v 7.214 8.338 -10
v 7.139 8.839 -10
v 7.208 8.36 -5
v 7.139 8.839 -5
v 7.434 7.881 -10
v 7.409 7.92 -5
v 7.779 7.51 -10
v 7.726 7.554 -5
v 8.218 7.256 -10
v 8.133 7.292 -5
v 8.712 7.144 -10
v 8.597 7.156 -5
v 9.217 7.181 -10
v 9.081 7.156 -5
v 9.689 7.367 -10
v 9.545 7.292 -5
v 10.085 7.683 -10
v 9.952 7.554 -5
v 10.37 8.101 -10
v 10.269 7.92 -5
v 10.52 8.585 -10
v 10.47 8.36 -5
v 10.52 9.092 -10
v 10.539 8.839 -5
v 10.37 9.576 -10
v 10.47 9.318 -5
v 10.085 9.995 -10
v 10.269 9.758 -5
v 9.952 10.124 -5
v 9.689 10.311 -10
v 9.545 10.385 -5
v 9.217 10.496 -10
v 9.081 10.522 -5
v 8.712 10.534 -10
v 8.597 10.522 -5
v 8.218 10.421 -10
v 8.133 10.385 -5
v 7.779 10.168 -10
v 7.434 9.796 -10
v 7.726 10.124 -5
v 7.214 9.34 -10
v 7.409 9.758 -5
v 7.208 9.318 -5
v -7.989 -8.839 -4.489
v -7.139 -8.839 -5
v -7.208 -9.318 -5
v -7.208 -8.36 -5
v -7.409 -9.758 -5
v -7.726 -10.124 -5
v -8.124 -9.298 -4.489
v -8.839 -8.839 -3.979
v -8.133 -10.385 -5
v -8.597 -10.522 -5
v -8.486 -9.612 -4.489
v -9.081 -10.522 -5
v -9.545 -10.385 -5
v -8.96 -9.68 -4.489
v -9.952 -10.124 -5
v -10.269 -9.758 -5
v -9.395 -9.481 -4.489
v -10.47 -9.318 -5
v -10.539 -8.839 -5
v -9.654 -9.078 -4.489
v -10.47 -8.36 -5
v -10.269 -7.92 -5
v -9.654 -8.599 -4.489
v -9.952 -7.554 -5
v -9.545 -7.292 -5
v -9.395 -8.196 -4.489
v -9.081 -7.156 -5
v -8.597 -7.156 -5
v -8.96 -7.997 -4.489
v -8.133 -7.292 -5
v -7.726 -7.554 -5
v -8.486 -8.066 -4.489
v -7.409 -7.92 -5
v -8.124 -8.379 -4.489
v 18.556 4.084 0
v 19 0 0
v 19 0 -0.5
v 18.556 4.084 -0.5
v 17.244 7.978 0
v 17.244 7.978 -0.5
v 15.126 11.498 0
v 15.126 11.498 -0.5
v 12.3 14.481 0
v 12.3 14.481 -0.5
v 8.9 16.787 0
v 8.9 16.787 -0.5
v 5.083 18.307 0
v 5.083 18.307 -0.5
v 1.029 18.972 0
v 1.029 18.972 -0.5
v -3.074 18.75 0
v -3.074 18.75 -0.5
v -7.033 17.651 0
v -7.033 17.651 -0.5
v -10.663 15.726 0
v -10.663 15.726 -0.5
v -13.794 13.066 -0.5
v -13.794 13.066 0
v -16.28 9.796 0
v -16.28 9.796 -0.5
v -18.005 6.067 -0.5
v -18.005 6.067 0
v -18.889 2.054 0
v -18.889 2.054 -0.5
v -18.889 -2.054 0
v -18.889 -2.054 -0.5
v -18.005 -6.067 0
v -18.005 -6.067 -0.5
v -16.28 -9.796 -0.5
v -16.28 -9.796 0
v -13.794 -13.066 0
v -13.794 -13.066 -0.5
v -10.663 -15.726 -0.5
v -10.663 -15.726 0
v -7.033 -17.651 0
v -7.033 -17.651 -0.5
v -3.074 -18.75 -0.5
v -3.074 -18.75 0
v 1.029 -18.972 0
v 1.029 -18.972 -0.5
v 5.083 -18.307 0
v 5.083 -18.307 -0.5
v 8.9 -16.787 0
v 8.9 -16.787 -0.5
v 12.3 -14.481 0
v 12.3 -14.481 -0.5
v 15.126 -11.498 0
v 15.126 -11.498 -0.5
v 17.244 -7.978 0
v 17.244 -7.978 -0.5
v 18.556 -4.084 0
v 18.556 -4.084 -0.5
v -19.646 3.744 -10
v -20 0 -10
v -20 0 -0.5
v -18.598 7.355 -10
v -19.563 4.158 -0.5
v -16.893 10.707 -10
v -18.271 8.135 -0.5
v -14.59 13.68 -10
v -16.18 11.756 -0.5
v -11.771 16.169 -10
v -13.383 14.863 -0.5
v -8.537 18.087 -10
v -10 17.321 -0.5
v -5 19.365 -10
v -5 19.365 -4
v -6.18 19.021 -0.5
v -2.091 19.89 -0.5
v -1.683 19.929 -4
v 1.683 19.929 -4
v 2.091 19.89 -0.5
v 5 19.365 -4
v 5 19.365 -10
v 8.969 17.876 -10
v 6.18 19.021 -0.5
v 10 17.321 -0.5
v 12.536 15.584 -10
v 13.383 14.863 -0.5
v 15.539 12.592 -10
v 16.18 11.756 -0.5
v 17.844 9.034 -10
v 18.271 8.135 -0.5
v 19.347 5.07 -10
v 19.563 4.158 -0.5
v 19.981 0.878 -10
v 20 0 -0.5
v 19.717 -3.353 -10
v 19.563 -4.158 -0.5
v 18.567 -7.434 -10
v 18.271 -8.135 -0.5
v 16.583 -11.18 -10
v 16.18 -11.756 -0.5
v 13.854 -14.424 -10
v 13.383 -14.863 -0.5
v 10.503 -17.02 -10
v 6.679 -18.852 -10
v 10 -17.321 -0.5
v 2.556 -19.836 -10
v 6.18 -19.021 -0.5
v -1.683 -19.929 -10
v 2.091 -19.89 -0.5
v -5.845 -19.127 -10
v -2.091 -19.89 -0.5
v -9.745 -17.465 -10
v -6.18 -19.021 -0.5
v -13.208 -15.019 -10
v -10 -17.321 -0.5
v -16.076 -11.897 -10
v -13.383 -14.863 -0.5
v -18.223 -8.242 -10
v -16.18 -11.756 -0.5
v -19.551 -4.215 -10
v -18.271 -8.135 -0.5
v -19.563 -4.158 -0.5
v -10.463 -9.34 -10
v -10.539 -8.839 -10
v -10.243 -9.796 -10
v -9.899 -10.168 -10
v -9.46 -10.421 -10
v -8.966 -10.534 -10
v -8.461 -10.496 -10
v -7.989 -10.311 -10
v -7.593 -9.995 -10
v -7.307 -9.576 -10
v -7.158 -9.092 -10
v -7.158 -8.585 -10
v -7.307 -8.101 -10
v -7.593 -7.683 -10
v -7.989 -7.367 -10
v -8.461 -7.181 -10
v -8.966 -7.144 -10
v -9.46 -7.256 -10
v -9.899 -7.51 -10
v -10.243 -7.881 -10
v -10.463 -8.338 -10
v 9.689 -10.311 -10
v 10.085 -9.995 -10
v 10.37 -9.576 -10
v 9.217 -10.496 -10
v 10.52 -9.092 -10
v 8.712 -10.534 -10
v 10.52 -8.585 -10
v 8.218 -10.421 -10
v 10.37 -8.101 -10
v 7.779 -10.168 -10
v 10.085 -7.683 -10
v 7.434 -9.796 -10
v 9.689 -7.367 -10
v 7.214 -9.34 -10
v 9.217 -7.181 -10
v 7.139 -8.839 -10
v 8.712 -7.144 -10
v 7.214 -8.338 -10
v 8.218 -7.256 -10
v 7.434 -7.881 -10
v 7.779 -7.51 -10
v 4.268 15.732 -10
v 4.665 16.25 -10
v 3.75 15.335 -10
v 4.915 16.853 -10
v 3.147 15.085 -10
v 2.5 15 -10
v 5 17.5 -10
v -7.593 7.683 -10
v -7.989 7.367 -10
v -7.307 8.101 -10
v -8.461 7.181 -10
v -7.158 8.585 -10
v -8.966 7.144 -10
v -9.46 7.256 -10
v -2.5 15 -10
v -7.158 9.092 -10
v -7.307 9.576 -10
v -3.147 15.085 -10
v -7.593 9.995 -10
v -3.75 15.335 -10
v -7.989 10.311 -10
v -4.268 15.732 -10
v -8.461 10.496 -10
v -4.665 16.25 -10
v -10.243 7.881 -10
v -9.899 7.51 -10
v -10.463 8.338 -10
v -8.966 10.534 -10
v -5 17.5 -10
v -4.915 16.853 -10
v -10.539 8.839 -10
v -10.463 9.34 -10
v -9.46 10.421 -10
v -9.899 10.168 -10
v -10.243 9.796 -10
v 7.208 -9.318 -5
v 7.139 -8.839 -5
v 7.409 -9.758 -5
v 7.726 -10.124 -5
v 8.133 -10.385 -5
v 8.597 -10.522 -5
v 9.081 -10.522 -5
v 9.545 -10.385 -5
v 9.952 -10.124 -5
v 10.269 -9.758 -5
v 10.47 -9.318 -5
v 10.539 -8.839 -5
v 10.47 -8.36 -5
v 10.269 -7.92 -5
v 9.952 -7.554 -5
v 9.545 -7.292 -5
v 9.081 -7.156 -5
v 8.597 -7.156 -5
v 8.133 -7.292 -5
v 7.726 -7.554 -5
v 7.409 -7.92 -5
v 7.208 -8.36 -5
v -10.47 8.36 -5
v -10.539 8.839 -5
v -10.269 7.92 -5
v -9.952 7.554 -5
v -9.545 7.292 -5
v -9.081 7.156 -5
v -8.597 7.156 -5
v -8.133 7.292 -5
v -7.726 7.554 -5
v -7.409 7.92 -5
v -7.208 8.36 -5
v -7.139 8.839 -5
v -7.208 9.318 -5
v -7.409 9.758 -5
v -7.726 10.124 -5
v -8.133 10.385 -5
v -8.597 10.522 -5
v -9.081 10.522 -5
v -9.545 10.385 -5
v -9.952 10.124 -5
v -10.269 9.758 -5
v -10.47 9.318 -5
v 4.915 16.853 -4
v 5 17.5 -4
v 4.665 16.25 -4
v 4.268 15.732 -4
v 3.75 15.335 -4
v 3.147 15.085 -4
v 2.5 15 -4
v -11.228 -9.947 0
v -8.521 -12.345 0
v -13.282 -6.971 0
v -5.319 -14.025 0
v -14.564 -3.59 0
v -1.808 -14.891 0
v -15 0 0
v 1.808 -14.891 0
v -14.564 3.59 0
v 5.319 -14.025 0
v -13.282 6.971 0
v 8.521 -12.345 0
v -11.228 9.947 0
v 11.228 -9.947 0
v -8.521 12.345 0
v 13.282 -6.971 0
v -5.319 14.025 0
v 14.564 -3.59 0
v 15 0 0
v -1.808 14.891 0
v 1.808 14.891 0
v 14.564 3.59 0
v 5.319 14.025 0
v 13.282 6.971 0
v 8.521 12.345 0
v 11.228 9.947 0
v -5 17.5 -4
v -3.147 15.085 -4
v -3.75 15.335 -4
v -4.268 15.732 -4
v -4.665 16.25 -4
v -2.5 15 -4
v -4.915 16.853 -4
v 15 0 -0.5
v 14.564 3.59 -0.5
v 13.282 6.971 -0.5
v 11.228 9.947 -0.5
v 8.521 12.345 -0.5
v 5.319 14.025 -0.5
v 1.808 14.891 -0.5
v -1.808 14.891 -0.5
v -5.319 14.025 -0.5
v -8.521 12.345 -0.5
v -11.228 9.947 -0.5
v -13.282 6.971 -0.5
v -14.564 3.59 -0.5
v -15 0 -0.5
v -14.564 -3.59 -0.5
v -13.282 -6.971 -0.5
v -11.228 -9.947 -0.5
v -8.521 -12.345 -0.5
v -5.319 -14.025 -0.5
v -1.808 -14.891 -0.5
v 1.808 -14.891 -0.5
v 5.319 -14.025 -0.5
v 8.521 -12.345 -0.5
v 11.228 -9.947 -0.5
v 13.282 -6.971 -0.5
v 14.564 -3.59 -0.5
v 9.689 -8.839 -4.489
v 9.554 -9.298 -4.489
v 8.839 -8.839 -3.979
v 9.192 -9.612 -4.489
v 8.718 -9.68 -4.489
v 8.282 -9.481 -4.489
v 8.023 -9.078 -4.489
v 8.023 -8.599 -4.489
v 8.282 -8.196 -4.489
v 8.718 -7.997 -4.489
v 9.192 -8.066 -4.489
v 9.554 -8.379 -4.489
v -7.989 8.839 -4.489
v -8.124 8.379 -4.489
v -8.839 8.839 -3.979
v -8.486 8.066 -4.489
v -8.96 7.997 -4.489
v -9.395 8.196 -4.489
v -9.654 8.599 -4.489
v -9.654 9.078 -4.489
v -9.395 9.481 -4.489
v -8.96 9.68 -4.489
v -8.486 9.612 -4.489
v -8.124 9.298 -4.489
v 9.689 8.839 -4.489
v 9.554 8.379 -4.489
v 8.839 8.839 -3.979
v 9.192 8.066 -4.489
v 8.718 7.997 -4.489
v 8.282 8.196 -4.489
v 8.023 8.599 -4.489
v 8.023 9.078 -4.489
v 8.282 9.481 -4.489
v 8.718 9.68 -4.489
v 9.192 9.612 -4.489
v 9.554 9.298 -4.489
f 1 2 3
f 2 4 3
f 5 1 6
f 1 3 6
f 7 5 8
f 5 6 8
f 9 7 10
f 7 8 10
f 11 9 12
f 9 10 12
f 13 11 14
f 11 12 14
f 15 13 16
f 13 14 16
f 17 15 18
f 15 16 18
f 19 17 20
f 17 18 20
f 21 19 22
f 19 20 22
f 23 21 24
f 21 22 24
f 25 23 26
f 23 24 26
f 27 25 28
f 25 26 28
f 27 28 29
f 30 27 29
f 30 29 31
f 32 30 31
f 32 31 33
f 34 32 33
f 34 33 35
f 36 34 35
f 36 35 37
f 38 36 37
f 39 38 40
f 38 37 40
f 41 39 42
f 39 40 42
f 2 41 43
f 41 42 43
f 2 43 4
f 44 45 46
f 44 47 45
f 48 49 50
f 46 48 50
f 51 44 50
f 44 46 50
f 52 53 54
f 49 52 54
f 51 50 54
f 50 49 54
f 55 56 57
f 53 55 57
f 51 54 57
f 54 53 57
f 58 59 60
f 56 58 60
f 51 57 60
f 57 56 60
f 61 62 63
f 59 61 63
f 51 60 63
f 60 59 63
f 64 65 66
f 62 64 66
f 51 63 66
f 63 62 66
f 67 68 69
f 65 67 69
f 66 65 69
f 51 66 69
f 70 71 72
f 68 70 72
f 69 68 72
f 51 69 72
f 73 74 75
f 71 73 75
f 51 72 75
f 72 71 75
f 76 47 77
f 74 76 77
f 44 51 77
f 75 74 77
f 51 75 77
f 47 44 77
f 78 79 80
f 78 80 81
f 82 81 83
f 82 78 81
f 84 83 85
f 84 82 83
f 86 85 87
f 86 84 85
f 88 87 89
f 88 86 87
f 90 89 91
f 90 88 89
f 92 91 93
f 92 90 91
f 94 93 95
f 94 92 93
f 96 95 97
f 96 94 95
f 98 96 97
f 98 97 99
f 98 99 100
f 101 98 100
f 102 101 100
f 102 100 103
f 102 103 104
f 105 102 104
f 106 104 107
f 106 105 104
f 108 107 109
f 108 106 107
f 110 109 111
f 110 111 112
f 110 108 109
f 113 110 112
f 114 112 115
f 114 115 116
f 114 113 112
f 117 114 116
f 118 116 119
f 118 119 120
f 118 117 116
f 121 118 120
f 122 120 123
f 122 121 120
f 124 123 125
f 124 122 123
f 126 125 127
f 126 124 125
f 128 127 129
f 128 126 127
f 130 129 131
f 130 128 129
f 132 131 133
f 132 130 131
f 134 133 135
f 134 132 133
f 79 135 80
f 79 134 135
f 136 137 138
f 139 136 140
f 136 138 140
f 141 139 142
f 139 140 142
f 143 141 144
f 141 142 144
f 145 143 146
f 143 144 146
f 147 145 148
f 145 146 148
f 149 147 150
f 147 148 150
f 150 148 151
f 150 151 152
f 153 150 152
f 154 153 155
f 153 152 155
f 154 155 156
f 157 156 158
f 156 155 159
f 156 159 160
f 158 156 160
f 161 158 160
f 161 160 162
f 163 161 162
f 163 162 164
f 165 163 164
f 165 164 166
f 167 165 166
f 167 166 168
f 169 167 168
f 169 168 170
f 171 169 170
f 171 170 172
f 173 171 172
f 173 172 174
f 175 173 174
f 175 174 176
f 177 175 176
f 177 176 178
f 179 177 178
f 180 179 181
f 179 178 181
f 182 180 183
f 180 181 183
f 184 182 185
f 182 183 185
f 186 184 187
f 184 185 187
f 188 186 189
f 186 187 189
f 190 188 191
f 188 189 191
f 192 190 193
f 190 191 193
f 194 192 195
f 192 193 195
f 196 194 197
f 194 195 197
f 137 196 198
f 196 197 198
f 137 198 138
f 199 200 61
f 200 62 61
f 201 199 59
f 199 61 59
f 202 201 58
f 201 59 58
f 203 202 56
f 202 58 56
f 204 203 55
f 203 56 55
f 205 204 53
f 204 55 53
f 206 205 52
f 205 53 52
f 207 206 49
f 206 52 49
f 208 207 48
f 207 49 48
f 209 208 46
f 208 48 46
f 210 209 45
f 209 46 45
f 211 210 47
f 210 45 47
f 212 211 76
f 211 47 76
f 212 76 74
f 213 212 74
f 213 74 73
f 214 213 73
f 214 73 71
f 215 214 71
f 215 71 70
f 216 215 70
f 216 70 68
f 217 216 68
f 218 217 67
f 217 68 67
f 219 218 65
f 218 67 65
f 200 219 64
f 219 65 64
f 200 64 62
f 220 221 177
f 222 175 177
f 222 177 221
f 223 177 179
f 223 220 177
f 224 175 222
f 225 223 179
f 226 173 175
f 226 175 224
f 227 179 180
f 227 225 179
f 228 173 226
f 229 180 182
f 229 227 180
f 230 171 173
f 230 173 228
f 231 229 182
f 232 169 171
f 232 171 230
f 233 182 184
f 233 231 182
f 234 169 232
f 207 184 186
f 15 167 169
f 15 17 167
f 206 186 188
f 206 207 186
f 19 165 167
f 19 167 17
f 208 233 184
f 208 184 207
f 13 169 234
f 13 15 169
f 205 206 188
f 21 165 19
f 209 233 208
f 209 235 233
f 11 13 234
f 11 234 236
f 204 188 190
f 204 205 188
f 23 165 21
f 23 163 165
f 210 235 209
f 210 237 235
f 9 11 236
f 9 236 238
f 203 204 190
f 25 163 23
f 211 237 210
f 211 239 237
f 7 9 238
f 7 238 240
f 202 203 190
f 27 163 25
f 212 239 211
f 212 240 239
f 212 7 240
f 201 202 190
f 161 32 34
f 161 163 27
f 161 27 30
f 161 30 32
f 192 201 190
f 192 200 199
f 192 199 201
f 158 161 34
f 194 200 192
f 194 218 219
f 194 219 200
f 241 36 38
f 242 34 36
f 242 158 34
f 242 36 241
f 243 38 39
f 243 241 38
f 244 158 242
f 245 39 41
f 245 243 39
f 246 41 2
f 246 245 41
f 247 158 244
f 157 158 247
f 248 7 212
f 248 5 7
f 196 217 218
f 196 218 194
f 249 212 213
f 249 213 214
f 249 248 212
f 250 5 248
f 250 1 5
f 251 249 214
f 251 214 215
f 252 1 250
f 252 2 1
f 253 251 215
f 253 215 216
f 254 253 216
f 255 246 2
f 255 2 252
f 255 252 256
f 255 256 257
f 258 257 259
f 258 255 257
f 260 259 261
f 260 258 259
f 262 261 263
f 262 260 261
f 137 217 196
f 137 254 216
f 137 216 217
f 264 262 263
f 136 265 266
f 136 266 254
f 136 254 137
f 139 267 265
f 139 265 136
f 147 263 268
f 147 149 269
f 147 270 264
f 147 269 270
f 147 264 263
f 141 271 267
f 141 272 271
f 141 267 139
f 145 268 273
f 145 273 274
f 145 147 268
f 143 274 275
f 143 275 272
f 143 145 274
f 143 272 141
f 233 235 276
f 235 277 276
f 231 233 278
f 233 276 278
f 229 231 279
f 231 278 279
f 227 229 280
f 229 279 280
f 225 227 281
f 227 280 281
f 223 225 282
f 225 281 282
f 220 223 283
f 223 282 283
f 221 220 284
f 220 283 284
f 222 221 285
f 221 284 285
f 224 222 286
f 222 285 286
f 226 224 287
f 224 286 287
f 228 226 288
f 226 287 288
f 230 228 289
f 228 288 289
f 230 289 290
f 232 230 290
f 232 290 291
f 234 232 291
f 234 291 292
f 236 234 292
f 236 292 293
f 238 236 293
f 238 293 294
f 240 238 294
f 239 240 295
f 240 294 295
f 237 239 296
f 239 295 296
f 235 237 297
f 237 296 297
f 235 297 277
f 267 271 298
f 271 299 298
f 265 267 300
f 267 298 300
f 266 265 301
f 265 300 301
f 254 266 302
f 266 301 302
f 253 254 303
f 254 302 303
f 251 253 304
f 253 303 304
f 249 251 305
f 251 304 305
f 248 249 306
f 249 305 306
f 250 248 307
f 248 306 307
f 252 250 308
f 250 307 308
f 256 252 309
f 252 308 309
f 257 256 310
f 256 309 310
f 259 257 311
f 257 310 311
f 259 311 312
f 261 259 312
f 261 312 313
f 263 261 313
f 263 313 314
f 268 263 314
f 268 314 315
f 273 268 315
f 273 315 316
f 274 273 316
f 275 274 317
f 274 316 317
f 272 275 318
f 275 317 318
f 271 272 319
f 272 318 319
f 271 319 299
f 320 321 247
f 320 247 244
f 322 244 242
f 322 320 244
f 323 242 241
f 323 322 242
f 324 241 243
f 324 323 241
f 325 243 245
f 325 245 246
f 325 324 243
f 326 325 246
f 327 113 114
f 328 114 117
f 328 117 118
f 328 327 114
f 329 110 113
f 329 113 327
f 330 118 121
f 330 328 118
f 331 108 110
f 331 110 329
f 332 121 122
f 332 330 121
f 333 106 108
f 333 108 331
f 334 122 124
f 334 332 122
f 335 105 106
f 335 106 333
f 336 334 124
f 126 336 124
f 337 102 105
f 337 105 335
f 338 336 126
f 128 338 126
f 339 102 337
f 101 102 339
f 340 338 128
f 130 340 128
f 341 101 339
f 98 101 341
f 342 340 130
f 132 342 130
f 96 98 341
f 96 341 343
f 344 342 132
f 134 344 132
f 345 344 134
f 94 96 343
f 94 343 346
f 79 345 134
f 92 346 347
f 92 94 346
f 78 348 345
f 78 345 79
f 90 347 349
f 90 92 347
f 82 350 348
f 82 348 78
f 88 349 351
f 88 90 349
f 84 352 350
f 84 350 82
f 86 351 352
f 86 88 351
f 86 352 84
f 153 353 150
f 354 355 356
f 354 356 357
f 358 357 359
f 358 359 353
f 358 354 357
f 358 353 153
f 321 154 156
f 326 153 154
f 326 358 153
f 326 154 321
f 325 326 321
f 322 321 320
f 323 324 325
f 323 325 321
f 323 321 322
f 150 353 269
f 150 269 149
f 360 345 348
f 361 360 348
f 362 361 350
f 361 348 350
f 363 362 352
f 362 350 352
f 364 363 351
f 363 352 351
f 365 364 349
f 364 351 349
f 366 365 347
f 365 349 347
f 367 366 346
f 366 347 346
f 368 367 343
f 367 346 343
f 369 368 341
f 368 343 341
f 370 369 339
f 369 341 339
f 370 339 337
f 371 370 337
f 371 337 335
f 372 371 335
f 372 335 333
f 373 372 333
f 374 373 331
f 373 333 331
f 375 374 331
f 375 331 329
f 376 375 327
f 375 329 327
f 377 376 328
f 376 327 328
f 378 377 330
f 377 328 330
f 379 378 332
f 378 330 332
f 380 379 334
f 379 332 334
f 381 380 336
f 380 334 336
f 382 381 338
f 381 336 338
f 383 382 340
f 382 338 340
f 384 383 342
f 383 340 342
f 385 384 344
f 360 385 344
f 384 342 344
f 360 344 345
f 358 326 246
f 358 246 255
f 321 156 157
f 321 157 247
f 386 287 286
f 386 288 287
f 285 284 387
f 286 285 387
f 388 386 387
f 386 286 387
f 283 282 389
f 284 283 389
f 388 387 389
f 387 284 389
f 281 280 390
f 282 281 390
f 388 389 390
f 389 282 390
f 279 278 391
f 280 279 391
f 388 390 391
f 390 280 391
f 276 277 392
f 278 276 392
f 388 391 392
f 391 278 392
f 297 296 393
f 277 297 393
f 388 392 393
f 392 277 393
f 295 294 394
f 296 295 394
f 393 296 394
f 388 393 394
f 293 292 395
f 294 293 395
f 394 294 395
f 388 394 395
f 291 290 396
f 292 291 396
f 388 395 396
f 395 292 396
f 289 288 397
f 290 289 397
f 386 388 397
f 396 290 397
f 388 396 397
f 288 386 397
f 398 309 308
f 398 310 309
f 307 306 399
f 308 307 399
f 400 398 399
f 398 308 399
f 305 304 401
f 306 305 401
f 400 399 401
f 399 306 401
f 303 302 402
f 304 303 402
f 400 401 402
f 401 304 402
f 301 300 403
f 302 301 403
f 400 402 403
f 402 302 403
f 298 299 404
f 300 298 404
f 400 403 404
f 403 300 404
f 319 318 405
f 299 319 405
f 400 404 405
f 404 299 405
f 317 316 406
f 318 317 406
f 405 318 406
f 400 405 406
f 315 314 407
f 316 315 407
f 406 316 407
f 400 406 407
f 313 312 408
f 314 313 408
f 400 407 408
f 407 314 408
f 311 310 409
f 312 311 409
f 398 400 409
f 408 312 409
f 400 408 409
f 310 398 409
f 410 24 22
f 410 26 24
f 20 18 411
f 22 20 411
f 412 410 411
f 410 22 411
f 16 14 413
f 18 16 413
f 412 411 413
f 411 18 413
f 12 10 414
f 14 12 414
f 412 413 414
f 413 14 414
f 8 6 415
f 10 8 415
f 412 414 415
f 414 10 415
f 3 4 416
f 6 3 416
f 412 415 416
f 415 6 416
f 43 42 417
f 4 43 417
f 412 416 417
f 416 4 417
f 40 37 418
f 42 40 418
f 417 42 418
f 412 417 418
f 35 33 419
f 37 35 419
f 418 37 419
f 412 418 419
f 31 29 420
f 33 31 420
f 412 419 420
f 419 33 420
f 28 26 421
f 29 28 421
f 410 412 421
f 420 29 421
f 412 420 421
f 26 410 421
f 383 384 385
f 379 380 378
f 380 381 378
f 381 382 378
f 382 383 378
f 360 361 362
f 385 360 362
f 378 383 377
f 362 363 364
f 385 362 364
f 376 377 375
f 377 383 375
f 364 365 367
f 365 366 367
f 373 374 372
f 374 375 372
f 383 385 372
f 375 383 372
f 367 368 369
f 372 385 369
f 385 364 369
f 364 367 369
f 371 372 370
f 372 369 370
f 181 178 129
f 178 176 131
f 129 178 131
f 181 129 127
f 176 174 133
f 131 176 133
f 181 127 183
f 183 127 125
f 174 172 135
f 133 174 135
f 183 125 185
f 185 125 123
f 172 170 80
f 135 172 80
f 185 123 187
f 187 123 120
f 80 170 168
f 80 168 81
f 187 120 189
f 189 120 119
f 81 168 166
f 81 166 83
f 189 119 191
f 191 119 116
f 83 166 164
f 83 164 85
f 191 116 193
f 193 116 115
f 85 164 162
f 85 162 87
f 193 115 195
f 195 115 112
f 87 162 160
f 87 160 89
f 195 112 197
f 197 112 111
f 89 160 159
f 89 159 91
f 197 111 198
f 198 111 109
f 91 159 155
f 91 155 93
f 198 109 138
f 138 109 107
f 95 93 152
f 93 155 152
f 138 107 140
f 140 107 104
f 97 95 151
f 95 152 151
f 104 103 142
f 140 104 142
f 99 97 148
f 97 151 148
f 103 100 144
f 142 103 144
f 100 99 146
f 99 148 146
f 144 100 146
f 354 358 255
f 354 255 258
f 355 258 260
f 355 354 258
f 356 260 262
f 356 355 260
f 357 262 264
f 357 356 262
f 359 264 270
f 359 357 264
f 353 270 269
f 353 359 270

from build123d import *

# Parameters (mm, degrees)
SKETCH2_R                = 19
SKETCH2_R_2              = 15
BOSS_EXTRUDE1_DEPTH      = 0.5
SKETCH3_R                = 20
BOSS_EXTRUDE2_DEPTH      = 9.5
CUT_EXTRUDE2_START       = -6
CUT_EXTRUDE2_DEPTH       = 6
M3_CLEARANCE_HOLE1_D     = 3.4
M3_CLEARANCE_HOLE1_DEPTH = 5
M3_CLEARANCE_HOLE1_TIP   = 1.021463052


with BuildPart() as part:
    # Sketch2 → Boss-Extrude1 (new body)
    with BuildSketch(Plane(origin=(0, 0, 0), x_dir=(0, 1, 0), z_dir=(0, 0, 1))):
        with Locations(Location((0, 0, 0), (0, 0, 270))):
            Circle(SKETCH2_R)
        with Locations(Location((0, 0, 0), (0, 0, 270))):
            Circle(SKETCH2_R_2, mode=Mode.SUBTRACT)
    extrude(amount=-BOSS_EXTRUDE1_DEPTH)

    # Sketch3 → Boss-Extrude2 (add)
    with BuildSketch(Plane(origin=(0, 0, -0.5), x_dir=(1, 0, 0), z_dir=(0, 0, -1))):
        with Locations(Location((0, 0, 0), (0, 0, 180))):
            Circle(SKETCH3_R)
    extrude(amount=BOSS_EXTRUDE2_DEPTH)

    # Sketch4 → Cut-Extrude2 (cut)
    with BuildSketch(Plane(origin=(0, 0, -10), x_dir=(1, 0, 0), z_dir=(0, 0, -1)).offset(CUT_EXTRUDE2_START)):
        with BuildLine():
            Line((-5, -17.5), (-5, -19.364916731))
            ThreePointArc((-5, -19.364916731), (0, -20), (5, -19.364916731))
            Line((5, -19.364916731), (5, -17.5))
            ThreePointArc((5, -17.5), (4.267766953, -15.732233047), (2.5, -15))
            Line((2.5, -15), (-2.5, -15))
            ThreePointArc((-2.5, -15), (-4.267766953, -15.732233047), (-5, -17.5))
        make_face()
    extrude(amount=CUT_EXTRUDE2_DEPTH, mode=Mode.SUBTRACT)

    # M3 Clearance Hole1
    with Locations(Plane(origin=(0, 0, -10), x_dir=(1, 0, 0), z_dir=(0, 0, -1))):
        with Locations((-8.838834765, -8.838834765), (8.838834765, -8.838834765), (8.838834765, 8.838834765), (-8.838834765, 8.838834765)):
            Hole(M3_CLEARANCE_HOLE1_D / 2, depth=M3_CLEARANCE_HOLE1_DEPTH)
            with Locations((0, 0, -(M3_CLEARANCE_HOLE1_DEPTH + M3_CLEARANCE_HOLE1_TIP / 2))):  # 118° drill point
                Cone(0, M3_CLEARANCE_HOLE1_D / 2, M3_CLEARANCE_HOLE1_TIP, mode=Mode.SUBTRACT)


solid = part.part
